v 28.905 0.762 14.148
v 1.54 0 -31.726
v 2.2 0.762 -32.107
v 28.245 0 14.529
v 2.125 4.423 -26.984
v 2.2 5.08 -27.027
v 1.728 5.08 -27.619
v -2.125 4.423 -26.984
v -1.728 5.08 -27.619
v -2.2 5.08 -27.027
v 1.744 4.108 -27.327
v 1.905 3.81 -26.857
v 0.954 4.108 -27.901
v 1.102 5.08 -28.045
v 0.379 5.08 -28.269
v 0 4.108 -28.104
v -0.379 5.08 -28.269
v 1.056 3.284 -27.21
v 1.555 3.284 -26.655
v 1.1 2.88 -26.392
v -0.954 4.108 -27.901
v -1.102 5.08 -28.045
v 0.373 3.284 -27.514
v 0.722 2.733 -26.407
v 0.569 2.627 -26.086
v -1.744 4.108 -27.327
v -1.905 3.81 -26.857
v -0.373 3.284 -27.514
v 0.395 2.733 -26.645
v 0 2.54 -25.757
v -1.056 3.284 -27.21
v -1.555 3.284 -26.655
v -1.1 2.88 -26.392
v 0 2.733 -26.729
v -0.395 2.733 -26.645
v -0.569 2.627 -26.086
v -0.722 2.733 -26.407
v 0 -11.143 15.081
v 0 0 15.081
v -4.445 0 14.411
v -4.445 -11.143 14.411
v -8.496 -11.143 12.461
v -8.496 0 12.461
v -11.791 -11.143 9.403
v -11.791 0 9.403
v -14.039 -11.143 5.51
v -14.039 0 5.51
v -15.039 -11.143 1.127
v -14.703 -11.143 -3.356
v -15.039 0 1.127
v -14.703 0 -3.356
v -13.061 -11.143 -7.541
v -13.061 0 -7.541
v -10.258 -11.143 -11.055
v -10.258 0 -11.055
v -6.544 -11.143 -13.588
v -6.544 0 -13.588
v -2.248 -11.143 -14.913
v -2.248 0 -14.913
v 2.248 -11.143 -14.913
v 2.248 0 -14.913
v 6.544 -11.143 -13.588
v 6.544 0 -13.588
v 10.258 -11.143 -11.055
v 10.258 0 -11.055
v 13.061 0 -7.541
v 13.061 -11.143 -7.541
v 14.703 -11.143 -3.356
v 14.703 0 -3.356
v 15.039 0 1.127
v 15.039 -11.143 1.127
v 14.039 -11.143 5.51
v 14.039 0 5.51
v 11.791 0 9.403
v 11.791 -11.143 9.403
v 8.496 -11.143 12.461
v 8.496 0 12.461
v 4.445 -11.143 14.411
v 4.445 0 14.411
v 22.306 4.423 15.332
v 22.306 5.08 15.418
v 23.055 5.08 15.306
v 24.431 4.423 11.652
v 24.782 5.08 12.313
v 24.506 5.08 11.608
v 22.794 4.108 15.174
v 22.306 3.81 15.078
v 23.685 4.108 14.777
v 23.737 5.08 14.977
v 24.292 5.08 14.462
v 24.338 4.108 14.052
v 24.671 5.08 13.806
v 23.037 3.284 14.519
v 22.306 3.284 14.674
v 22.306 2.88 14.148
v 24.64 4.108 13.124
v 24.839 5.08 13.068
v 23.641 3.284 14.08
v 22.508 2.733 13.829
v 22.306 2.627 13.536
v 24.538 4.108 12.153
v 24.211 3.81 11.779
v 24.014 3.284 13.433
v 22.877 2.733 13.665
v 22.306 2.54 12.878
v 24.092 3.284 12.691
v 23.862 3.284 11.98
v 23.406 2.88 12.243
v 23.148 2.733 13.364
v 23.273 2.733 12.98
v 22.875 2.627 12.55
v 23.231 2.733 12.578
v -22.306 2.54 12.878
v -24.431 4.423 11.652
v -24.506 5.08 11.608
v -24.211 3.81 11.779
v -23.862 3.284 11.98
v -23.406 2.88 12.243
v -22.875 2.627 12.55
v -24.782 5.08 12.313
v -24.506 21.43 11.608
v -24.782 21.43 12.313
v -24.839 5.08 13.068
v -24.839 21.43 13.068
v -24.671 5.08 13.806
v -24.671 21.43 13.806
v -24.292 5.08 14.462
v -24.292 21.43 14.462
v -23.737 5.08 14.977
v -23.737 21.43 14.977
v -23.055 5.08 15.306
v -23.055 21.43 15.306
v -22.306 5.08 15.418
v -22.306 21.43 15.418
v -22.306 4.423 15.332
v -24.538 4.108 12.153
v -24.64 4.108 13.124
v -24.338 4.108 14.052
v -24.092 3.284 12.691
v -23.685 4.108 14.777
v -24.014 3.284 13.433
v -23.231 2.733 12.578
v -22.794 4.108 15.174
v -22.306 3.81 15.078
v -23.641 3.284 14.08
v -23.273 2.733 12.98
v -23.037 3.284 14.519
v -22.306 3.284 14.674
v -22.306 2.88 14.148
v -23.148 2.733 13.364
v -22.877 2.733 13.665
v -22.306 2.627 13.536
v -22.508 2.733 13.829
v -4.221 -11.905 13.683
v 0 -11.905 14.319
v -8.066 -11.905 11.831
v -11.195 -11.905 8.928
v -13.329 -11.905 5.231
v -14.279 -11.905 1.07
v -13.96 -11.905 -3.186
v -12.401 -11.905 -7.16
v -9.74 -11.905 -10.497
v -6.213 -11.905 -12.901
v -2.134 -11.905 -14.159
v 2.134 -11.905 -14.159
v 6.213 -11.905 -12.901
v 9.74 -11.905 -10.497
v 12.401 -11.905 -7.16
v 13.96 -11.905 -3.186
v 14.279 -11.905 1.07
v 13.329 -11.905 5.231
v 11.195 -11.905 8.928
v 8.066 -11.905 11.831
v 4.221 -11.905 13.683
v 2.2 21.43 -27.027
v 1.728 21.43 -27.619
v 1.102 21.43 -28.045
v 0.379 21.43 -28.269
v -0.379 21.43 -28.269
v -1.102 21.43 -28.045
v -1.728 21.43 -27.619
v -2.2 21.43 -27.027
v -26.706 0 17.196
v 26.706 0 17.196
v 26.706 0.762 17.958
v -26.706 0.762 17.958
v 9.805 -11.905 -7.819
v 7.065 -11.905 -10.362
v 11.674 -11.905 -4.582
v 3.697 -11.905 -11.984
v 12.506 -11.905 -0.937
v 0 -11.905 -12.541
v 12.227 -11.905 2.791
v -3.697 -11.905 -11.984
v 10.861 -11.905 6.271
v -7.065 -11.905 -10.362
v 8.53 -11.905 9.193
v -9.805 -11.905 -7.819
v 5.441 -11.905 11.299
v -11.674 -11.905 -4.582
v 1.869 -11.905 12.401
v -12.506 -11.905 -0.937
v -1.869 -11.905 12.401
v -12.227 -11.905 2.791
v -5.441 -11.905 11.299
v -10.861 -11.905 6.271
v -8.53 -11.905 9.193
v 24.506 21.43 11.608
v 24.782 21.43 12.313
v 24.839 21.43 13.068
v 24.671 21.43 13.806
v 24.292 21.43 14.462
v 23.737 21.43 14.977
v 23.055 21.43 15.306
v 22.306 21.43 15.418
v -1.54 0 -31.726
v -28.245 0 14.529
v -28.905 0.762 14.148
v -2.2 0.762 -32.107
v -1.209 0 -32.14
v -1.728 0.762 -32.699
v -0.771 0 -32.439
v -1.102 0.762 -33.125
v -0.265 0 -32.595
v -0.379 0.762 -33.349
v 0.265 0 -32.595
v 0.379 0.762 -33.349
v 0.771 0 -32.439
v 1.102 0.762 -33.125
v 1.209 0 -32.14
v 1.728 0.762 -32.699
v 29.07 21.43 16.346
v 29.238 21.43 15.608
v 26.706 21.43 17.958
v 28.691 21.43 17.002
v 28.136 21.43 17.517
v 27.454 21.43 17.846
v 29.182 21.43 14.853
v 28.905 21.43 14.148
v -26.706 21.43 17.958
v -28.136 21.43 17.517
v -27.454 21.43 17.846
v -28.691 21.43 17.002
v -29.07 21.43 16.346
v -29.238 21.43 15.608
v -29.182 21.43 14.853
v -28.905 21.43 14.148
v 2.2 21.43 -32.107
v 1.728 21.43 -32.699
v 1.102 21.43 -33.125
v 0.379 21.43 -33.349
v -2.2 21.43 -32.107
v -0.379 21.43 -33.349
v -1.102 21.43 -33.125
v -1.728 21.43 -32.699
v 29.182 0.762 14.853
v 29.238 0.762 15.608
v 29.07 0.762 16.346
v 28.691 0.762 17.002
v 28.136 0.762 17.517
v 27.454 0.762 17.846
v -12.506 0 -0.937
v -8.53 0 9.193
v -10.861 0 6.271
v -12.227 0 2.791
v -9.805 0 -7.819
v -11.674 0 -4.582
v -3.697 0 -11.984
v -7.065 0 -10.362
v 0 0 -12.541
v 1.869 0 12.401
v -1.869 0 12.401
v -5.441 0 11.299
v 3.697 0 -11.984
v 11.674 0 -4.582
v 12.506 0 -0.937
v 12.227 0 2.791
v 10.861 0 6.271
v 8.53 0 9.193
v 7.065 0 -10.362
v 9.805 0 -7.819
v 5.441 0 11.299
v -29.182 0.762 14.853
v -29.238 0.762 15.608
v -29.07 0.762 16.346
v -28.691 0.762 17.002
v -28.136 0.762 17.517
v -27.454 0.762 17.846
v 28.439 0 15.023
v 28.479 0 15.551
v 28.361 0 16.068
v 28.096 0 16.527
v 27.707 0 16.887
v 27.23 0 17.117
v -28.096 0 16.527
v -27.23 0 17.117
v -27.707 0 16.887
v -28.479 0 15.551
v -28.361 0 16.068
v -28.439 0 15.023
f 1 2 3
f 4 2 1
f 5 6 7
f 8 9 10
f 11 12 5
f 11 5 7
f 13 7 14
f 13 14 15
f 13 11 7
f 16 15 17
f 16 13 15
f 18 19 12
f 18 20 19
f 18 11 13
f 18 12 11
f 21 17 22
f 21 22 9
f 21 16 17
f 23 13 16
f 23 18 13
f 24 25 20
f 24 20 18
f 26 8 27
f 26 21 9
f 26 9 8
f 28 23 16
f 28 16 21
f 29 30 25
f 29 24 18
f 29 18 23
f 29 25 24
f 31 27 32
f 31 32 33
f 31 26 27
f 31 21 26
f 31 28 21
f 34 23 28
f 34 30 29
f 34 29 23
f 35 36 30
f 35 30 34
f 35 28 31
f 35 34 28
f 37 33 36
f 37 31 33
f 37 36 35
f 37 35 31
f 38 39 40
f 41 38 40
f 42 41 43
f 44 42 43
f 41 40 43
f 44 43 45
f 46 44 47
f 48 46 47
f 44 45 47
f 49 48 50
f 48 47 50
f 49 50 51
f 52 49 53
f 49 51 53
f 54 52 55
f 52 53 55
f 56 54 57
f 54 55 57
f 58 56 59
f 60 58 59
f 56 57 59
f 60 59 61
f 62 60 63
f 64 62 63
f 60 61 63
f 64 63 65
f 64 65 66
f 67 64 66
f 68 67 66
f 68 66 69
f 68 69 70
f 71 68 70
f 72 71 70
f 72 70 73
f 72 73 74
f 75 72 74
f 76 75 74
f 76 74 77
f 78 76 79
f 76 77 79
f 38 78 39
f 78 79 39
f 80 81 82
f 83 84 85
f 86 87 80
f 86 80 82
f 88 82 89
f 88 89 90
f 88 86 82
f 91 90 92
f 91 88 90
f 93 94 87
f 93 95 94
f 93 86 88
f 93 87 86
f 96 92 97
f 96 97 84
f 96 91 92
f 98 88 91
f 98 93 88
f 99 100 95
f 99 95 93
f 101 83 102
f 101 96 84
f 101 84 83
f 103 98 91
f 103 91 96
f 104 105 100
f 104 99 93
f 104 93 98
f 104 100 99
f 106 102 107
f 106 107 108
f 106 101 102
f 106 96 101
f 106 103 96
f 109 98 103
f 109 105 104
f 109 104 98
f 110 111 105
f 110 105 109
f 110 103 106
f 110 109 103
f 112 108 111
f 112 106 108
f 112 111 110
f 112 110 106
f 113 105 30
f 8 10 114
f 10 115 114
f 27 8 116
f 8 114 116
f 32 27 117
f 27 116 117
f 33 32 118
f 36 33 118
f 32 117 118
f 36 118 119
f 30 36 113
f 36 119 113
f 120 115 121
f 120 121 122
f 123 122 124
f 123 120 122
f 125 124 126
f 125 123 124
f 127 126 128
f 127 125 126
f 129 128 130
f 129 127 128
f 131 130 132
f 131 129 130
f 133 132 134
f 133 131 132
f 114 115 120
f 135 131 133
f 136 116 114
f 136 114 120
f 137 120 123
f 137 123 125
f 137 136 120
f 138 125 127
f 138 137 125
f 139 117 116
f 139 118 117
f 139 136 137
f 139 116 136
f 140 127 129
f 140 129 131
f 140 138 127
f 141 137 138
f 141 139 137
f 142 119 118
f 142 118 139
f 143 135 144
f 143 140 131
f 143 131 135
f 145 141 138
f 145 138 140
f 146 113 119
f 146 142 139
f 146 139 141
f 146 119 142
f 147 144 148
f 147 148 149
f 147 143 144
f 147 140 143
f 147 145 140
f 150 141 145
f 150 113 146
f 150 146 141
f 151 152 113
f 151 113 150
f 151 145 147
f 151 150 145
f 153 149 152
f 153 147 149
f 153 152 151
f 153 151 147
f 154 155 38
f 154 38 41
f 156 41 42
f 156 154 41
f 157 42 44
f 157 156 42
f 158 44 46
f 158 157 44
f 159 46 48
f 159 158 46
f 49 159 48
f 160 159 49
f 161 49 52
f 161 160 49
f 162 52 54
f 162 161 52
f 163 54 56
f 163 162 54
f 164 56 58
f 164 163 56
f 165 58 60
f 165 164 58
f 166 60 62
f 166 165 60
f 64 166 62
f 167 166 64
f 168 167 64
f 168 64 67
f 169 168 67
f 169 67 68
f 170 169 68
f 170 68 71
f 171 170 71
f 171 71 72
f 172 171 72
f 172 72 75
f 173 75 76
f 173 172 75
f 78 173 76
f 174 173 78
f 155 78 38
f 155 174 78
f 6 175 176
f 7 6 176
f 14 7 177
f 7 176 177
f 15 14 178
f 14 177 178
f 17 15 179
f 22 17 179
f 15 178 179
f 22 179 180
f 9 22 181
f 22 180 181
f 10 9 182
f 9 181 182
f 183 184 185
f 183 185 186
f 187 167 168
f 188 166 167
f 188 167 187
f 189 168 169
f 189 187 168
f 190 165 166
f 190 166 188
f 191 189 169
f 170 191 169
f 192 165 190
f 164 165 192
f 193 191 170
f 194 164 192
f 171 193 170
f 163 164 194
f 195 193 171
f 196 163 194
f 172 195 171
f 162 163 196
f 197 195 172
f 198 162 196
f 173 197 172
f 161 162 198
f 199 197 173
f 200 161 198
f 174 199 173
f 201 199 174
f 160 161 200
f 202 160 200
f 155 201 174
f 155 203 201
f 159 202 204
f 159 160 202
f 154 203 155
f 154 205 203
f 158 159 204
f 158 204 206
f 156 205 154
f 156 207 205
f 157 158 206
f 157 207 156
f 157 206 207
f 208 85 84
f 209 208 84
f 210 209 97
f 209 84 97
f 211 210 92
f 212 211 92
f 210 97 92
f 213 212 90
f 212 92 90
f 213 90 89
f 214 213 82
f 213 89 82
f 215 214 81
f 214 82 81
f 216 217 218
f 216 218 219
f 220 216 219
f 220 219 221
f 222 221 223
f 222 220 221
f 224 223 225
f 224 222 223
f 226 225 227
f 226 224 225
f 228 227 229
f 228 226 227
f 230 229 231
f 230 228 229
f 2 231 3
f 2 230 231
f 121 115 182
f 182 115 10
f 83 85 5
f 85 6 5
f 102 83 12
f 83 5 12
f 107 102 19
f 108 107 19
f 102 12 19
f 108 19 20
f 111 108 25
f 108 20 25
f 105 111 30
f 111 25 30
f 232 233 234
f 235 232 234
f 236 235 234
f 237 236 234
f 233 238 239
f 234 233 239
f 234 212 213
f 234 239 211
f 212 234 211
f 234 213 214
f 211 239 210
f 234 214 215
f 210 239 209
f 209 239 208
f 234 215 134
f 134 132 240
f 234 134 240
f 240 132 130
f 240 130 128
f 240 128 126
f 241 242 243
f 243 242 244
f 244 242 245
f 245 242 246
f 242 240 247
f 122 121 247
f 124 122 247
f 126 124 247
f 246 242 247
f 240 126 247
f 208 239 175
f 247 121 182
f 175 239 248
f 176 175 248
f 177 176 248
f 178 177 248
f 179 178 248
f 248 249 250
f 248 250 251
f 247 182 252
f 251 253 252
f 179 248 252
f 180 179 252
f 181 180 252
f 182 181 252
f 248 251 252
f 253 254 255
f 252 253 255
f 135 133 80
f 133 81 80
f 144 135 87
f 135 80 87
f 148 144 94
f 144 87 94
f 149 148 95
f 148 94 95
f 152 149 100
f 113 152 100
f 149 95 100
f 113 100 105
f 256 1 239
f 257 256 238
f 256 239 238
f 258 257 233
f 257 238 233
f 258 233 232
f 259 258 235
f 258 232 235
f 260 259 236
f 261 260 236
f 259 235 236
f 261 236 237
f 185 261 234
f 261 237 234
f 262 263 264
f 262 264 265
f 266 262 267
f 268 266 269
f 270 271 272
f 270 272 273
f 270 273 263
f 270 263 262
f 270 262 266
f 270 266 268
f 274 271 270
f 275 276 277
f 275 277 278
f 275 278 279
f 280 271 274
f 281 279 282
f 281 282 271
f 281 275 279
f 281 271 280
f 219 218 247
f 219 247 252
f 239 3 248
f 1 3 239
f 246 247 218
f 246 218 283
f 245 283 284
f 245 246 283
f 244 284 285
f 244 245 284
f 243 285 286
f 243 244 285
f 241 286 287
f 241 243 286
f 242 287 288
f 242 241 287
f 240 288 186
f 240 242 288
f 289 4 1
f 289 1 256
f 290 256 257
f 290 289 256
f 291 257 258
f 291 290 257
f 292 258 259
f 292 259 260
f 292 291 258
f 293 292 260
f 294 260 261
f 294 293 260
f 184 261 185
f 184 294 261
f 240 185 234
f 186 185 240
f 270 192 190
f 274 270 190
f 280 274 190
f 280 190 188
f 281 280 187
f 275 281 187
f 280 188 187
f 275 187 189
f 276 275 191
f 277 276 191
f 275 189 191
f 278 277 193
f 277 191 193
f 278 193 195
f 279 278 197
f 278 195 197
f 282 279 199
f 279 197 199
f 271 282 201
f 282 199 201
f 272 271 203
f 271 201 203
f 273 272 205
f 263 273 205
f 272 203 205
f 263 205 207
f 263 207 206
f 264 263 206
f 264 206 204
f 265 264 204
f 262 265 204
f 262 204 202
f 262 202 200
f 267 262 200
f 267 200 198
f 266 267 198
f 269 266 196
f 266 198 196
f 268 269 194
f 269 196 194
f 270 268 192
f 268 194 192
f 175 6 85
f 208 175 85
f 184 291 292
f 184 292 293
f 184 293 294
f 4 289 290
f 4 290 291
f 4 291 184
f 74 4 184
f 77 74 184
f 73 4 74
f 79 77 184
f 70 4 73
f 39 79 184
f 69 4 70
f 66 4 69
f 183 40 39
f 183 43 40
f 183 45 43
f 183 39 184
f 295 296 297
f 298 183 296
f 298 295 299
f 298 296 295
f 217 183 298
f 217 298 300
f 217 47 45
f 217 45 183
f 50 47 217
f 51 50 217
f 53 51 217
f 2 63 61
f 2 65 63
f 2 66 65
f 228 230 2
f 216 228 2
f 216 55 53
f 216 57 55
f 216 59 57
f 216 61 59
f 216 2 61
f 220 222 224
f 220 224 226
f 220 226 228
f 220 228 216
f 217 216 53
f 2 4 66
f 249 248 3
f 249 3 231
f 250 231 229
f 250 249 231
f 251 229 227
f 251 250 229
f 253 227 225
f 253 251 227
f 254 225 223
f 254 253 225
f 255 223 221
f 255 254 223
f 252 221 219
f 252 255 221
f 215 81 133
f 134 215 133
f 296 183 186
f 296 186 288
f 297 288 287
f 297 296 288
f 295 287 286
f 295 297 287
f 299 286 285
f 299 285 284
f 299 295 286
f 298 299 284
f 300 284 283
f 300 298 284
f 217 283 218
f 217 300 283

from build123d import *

# Parameters (mm, degrees)
BOSS_EXTRUDE1_DEPTH = 21.42998
SHELL1_T            = -2.54
SKETCH3_R           = 15.08125
BOSS_EXTRUDE2_DEPTH = 11.90498
FILLET1_R           = 2.54
FILLET2_R           = 2.54
FILLET3_R           = 2.54
CHAMFER2_SIZE       = 0.762
SKETCH5_R           = 12.54125
CUT_EXTRUDE1_DEPTH  = 11.90498
CHAMFER3_SIZE       = 0.762


with BuildPart() as part:
    # Sketch1 → Boss-Extrude1 (new body)
    with BuildSketch(Plane(origin=(0, 0, 0), x_dir=(1, 0, 0), z_dir=(0, 1, 0))):
        Polygon((0, 35.91687), (31.104921844, -17.958435), (-31.104921844, -17.958435), align=None)
    extrude(amount=BOSS_EXTRUDE1_DEPTH)

    # Shell1
    shell1_openings = [part.faces().sort_by_distance(p)[0] for p in [
        (0, 21.42998, 0),
    ]]
    offset(amount=SHELL1_T, openings=shell1_openings, kind=Kind.INTERSECTION)

    # Sketch3 → Boss-Extrude2 (add)
    with BuildSketch(Plane.XZ):
        with Locations(Location((0, 0, 0), (0, 0, 90))):
            Circle(SKETCH3_R)
    extrude(amount=BOSS_EXTRUDE2_DEPTH)

    # Fillet1
    fillet1_edges = [part.edges().sort_by_distance(p)[0] for p in [
        (0, 10.71499, -35.91687),
        (31.104921844, 10.71499, 17.958435),
        (-31.104921844, 10.71499, 17.958435),
    ]]
    fillet(fillet1_edges, radius=FILLET1_R)

    # Fillet2
    fillet2_edges = [part.edges().sort_by_distance(p)[0] for p in [
        (0, 11.98499, -30.83687),
        (-26.705512793, 11.98499, 15.418435),
        (26.705512793, 11.98499, 15.418435),
    ]]
    fillet(fillet2_edges, radius=FILLET2_R)

    # Fillet3
    fillet3_edges = [part.edges().sort_by_distance(p)[0] for p in [
        (13.352756397, 2.54, -7.7092175),
        (-13.352756397, 2.54, -7.7092175),
        (0, 2.54, 15.418435),
        (-24.505808268, 2.54, 14.148435),
        (24.505808268, 2.54, 14.148435),
        (0, 2.54, -28.29687),
    ]]
    fillet(fillet3_edges, radius=FILLET3_R)

    # Chamfer2
    chamfer2_edges = [part.edges().sort_by_distance(p)[0] for p in [
        (-15.552460922, 0, -8.9792175),
        (15.552460922, 0, -8.9792175),
        (0, 0, 17.958435),
        (-28.905217319, 0, 16.688435),
        (28.905217319, 0, 16.688435),
        (0, 0, -33.37687),
    ]]
    chamfer(chamfer2_edges, length=CHAMFER2_SIZE)

    # Sketch5 → Cut-Extrude1 (cut)
    with BuildSketch(Plane.XZ.offset(11.90498)):
        with Locations(Location((0, 0, 0), (0, 0, 270))):
            Circle(SKETCH5_R)
    extrude(amount=-CUT_EXTRUDE1_DEPTH, mode=Mode.SUBTRACT)

    # Chamfer3
    chamfer3_edges = [part.edges().sort_by_distance(p)[0] for p in [
        (0, -11.90498, -15.08125),
    ]]
    chamfer(chamfer3_edges, length=CHAMFER3_SIZE)


solid = part.part
